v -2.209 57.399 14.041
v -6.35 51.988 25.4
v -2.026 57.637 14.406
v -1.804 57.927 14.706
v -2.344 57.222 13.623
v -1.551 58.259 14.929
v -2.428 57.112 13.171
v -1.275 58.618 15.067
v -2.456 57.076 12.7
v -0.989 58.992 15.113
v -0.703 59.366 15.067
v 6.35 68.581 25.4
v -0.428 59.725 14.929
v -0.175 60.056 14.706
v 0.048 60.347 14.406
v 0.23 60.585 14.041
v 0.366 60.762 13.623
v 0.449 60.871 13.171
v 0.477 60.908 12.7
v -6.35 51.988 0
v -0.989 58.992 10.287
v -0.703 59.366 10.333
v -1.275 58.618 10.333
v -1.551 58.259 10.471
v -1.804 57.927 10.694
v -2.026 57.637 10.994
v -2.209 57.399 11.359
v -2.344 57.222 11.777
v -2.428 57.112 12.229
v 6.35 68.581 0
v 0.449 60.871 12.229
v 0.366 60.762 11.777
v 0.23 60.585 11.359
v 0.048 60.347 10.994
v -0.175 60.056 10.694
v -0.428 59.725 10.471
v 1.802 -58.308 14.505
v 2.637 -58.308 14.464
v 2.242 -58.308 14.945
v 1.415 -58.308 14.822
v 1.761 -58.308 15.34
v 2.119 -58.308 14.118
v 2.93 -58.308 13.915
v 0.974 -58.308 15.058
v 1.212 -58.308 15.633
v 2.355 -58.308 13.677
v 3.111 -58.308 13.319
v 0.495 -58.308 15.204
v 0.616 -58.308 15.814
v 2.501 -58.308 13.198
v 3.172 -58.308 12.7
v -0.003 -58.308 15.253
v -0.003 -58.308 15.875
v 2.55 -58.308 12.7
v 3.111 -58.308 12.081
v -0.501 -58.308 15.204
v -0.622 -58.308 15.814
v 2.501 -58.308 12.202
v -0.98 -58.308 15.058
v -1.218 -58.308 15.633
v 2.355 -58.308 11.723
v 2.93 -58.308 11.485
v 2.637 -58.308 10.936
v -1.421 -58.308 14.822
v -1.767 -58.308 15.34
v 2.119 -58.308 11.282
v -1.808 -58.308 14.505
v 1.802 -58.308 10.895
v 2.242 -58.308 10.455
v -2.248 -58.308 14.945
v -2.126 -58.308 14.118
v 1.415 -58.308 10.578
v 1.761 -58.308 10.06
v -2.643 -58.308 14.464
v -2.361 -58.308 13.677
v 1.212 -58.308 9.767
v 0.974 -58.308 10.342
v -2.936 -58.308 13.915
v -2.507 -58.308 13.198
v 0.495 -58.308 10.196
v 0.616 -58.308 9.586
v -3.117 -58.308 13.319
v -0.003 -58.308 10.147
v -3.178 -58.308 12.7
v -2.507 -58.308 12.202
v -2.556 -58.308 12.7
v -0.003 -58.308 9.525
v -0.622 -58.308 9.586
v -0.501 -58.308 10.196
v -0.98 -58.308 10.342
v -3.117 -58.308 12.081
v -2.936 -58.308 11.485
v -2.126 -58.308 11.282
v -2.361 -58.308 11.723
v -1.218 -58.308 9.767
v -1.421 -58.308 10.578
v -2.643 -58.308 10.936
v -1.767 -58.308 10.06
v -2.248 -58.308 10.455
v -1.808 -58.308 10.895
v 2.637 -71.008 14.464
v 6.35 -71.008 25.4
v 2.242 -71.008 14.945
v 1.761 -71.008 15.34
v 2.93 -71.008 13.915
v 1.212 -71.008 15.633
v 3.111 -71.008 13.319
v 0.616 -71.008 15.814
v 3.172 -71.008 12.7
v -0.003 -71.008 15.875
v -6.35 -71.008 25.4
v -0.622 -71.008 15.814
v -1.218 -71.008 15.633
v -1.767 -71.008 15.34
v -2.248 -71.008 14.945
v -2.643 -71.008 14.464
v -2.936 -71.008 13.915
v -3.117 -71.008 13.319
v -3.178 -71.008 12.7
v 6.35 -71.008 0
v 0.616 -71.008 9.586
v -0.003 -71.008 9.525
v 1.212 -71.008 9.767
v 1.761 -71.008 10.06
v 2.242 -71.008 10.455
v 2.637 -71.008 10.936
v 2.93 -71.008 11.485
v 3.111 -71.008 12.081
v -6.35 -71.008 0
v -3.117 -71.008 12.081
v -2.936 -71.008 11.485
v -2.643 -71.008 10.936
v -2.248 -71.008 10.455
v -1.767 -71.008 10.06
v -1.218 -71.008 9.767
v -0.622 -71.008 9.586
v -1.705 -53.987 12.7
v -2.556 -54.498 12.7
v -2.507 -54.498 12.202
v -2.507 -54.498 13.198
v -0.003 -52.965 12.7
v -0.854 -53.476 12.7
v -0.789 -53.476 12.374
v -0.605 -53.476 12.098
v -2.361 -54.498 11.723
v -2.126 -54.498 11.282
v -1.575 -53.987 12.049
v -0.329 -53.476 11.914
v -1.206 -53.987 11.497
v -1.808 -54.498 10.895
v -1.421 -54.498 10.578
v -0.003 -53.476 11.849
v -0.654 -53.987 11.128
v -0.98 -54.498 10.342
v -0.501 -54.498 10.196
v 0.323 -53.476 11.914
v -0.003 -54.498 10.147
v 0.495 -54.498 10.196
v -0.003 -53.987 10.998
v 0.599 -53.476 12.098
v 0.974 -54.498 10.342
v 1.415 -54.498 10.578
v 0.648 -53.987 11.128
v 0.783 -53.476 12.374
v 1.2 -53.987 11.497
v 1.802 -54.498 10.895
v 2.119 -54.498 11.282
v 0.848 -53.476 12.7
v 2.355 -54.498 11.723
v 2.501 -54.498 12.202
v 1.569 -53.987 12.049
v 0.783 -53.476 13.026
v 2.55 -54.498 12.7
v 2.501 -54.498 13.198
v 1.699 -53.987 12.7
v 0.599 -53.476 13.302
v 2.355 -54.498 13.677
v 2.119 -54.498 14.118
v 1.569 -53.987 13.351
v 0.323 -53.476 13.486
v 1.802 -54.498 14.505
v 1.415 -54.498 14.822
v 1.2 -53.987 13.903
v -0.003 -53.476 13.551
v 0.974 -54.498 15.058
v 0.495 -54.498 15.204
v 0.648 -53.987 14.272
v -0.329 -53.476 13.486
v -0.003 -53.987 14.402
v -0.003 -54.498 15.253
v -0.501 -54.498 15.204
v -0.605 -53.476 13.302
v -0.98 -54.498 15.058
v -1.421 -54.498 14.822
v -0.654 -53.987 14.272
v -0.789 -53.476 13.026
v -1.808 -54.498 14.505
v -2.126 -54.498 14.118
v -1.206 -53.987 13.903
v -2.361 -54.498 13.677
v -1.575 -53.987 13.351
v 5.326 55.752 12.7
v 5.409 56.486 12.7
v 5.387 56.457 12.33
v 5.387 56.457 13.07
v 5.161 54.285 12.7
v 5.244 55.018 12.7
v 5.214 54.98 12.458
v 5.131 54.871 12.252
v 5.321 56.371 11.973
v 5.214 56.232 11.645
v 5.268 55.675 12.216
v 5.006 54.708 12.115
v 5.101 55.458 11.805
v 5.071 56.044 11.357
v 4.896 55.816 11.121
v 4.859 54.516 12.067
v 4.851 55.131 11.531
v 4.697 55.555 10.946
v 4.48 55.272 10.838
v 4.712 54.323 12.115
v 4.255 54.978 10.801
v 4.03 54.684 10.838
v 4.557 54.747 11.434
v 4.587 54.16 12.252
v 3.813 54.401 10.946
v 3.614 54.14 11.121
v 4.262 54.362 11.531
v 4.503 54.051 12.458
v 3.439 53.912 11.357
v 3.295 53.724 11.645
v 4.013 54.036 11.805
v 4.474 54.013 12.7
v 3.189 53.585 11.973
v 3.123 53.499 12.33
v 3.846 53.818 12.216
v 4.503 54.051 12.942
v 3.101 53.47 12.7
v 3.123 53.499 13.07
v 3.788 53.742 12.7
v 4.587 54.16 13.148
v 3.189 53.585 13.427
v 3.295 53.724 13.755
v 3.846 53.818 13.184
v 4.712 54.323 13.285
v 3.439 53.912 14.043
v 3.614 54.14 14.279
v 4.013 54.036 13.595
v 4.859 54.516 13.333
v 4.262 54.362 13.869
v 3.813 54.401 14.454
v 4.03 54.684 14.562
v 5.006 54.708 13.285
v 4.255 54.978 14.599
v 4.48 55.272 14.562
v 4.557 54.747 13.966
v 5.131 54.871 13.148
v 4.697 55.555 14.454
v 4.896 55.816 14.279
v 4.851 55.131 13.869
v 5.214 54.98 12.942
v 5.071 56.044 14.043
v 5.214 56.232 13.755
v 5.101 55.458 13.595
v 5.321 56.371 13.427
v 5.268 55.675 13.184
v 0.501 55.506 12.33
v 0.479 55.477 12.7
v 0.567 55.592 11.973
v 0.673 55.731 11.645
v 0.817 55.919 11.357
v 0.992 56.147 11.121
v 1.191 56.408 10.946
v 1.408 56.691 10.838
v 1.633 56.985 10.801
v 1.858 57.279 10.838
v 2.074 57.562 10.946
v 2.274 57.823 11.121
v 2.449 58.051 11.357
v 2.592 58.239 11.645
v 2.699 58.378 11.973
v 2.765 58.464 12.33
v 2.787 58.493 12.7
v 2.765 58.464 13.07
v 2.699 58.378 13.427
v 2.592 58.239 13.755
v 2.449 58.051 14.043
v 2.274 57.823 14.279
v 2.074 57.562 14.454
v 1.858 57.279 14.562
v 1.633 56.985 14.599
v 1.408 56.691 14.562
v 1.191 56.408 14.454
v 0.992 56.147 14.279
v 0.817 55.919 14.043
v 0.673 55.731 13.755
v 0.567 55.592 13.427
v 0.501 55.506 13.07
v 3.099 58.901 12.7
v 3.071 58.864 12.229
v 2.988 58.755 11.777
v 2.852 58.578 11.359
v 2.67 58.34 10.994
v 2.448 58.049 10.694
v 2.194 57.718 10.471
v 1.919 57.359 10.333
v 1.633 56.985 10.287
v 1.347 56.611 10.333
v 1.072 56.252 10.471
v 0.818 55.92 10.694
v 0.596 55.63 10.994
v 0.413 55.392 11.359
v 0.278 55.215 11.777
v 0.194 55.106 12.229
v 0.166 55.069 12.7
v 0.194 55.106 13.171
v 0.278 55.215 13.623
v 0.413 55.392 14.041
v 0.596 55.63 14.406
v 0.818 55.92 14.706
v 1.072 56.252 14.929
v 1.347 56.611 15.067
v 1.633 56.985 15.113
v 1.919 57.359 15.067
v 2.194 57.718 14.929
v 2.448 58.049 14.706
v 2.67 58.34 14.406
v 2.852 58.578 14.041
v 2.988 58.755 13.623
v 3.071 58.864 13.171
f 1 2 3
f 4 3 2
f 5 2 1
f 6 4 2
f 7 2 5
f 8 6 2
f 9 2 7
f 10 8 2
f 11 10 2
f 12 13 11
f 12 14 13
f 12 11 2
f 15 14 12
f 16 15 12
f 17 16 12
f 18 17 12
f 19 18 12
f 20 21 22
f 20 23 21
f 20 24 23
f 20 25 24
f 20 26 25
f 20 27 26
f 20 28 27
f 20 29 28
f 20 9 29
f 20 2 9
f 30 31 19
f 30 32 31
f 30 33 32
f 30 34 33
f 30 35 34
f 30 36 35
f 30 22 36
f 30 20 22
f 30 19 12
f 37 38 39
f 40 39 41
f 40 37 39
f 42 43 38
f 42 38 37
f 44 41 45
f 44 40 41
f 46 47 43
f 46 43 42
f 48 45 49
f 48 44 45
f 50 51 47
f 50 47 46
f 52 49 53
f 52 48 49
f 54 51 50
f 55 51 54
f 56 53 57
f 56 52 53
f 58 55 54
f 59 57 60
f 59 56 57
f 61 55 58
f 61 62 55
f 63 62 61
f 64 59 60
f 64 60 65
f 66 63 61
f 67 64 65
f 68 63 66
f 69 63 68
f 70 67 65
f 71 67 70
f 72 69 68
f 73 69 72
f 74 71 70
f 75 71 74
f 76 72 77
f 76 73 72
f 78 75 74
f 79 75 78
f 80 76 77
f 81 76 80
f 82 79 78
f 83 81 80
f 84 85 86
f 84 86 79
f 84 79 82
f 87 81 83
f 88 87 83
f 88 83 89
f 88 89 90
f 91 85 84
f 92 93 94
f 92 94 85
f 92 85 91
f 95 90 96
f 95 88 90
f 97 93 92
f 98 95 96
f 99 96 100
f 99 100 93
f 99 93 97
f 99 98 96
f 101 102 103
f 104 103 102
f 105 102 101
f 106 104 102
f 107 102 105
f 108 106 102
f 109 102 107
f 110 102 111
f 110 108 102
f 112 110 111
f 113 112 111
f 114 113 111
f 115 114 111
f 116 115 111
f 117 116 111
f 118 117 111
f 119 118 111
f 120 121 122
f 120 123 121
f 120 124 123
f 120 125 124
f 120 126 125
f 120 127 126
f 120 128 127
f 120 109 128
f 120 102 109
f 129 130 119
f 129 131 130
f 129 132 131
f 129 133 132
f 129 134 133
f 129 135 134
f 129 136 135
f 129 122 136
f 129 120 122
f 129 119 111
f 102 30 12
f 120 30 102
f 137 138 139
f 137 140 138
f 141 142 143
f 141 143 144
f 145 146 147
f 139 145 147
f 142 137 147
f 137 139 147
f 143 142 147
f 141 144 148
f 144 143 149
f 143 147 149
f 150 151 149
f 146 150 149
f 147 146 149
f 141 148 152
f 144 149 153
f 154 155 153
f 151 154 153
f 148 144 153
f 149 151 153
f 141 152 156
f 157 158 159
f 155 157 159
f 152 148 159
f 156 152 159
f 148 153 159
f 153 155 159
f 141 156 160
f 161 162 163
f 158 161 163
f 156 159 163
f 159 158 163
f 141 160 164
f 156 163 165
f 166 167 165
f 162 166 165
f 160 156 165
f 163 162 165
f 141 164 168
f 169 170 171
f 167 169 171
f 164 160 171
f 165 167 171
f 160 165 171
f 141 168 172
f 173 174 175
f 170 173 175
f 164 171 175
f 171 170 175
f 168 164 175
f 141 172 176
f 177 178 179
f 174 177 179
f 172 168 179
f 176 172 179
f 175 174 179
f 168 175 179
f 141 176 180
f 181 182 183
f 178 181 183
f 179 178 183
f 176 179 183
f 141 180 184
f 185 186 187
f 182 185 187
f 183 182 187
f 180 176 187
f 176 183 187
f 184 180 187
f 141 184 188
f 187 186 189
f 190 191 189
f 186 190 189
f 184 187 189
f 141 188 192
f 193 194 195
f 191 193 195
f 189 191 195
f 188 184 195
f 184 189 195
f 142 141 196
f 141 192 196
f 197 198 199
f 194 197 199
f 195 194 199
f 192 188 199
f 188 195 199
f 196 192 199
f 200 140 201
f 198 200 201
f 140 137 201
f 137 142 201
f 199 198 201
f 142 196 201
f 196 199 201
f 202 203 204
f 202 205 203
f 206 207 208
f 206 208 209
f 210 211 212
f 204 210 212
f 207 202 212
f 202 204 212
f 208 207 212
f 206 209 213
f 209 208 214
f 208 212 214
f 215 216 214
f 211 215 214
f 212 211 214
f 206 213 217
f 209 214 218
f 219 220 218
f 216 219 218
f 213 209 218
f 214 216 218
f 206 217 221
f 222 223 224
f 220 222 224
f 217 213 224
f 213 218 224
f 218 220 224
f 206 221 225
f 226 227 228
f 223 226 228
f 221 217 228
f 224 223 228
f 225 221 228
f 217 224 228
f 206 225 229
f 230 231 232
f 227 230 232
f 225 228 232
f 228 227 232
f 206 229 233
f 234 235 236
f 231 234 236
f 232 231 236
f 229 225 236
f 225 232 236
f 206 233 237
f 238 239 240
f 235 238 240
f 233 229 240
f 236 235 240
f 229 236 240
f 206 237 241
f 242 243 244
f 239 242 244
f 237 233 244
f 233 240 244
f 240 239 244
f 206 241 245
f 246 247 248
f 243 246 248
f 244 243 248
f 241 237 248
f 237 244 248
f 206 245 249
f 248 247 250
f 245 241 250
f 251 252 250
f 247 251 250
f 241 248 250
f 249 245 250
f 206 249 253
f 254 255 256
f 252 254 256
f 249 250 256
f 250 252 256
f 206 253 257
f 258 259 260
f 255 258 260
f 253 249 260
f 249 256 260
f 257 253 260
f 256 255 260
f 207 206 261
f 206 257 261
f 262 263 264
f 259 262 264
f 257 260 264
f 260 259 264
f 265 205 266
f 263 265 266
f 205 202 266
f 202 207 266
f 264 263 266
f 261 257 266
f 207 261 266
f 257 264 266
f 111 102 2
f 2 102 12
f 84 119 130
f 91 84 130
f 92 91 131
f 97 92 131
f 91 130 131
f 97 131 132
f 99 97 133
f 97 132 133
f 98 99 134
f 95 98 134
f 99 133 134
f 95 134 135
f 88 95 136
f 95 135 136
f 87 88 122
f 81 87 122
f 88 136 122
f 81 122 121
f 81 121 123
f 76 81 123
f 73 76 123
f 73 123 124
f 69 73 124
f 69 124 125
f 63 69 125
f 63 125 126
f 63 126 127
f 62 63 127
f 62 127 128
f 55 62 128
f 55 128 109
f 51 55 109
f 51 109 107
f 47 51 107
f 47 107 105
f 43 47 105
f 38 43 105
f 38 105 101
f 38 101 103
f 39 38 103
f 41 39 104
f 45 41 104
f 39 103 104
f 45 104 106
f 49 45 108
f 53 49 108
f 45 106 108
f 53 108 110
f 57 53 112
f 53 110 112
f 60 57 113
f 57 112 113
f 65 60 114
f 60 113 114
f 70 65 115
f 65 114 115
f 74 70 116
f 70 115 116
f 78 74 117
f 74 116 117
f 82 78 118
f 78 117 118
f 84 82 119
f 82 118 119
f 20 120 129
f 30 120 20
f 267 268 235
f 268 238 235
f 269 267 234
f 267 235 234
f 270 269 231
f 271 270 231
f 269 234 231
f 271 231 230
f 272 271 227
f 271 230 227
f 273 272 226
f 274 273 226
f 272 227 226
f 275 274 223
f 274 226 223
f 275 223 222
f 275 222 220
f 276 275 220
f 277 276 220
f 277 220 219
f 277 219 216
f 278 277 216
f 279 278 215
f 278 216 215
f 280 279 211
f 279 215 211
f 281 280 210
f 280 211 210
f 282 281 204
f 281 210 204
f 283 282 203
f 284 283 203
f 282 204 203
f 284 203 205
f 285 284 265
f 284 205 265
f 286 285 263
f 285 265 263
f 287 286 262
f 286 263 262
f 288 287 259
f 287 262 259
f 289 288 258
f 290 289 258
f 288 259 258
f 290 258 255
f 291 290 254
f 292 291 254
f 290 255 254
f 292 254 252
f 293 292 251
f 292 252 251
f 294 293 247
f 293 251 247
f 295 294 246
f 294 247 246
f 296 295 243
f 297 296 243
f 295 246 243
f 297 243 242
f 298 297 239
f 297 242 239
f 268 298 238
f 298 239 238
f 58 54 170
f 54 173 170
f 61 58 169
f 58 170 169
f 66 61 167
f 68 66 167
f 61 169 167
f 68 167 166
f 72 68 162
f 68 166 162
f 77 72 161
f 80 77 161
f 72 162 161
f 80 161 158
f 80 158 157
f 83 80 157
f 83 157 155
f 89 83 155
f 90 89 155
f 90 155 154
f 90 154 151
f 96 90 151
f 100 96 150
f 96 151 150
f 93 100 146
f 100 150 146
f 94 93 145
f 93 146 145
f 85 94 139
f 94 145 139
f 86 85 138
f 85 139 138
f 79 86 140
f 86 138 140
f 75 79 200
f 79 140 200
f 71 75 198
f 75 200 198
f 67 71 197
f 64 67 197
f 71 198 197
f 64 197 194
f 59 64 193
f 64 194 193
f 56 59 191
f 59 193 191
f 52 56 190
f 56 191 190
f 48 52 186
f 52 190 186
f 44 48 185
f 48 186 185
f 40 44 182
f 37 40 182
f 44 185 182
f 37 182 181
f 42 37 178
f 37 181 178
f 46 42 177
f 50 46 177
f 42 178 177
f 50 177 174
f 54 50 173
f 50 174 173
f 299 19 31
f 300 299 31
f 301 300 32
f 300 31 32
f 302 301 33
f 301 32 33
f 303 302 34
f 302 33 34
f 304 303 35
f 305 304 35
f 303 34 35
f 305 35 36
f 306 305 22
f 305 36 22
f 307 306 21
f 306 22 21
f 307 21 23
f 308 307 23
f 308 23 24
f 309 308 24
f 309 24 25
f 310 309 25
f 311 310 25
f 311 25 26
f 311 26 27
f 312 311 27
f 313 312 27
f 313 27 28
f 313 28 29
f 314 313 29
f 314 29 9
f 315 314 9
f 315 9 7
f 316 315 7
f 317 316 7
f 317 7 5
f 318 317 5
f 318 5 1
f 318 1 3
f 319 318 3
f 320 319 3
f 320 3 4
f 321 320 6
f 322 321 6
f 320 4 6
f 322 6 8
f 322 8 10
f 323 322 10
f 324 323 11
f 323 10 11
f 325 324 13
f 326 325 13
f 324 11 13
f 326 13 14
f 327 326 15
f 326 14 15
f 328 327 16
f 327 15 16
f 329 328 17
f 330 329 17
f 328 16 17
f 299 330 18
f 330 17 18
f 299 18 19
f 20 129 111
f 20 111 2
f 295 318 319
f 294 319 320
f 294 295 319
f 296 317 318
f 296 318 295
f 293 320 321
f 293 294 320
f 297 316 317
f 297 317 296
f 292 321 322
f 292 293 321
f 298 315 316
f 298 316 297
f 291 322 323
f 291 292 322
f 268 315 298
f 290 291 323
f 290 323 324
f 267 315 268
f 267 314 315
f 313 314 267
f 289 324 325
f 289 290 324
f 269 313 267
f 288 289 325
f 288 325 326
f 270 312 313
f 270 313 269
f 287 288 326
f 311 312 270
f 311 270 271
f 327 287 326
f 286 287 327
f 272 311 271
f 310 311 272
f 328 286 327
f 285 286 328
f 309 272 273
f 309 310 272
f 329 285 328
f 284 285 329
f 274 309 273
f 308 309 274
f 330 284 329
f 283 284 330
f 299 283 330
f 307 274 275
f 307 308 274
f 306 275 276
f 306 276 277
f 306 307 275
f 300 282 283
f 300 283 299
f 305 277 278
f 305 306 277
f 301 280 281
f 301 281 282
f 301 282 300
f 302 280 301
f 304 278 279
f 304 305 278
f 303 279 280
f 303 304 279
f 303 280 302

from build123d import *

# Parameters (mm, degrees)
EXTRUDE1_DEPTH                    = 25.4
F_10_24_TAPPED_HOLE1_D            = 3.7973
F_10_24_TAPPED_HOLE1_DEPTH        = 6.604
F_10_24_TAPPED_HOLE1_CBORE_D      = 4.826
F_10_24_TAPPED_HOLE1_CBORE_DEPTH  = 3.302
F_10_24_TAPPED_HOLE1_TIP          = 1.140824014
F_1_4_20_TAPPED_HOLE2_D           = 5.1054
F_1_4_20_TAPPED_HOLE2_DEPTH       = 16.51
F_1_4_20_TAPPED_HOLE2_CBORE_D     = 6.35
F_1_4_20_TAPPED_HOLE2_CBORE_DEPTH = 12.7
F_1_4_20_TAPPED_HOLE2_TIP         = 1.533816902


with BuildPart() as part:
    # Sketch1 → Extrude1 (new body)
    with BuildSketch(Plane.XY):
        Polygon((-6.35, 51.987941466), (6.35, 68.580838747), (6.35, -71.008376889), (-6.35, -71.008376889), align=None)
    extrude(amount=EXTRUDE1_DEPTH)

    # #10-24 Tapped Hole1
    with Locations(Plane(origin=(-37.120191611, 11.785844717, 18.061260674), x_dir=(0.6077917109691768, 0.7940964904072809, 0), z_dir=(-0.7940964904072809, 0.6077917109691768, 0))):
        with Locations((59.446155795, 5.361260674)):
            CounterBoreHole(F_10_24_TAPPED_HOLE1_D / 2, F_10_24_TAPPED_HOLE1_CBORE_D / 2, F_10_24_TAPPED_HOLE1_CBORE_DEPTH, depth=F_10_24_TAPPED_HOLE1_DEPTH)
            with Locations((0, 0, -(F_10_24_TAPPED_HOLE1_DEPTH + F_10_24_TAPPED_HOLE1_TIP / 2))):  # 118° drill point
                Cone(0, F_10_24_TAPPED_HOLE1_D / 2, F_10_24_TAPPED_HOLE1_TIP, mode=Mode.SUBTRACT)

    # 1/4-20 Tapped Hole2
    with Locations(Plane(origin=(-43.496001464, -71.008376889, 18.061260674), x_dir=(-1, 0, 0), z_dir=(0, -1, 0))):
        with Locations((-43.492926523, 5.361260674)):
            CounterBoreHole(F_1_4_20_TAPPED_HOLE2_D / 2, F_1_4_20_TAPPED_HOLE2_CBORE_D / 2, F_1_4_20_TAPPED_HOLE2_CBORE_DEPTH, depth=F_1_4_20_TAPPED_HOLE2_DEPTH)
            with Locations((0, 0, -(F_1_4_20_TAPPED_HOLE2_DEPTH + F_1_4_20_TAPPED_HOLE2_TIP / 2))):  # 118° drill point
                Cone(0, F_1_4_20_TAPPED_HOLE2_D / 2, F_1_4_20_TAPPED_HOLE2_TIP, mode=Mode.SUBTRACT)


solid = part.part
